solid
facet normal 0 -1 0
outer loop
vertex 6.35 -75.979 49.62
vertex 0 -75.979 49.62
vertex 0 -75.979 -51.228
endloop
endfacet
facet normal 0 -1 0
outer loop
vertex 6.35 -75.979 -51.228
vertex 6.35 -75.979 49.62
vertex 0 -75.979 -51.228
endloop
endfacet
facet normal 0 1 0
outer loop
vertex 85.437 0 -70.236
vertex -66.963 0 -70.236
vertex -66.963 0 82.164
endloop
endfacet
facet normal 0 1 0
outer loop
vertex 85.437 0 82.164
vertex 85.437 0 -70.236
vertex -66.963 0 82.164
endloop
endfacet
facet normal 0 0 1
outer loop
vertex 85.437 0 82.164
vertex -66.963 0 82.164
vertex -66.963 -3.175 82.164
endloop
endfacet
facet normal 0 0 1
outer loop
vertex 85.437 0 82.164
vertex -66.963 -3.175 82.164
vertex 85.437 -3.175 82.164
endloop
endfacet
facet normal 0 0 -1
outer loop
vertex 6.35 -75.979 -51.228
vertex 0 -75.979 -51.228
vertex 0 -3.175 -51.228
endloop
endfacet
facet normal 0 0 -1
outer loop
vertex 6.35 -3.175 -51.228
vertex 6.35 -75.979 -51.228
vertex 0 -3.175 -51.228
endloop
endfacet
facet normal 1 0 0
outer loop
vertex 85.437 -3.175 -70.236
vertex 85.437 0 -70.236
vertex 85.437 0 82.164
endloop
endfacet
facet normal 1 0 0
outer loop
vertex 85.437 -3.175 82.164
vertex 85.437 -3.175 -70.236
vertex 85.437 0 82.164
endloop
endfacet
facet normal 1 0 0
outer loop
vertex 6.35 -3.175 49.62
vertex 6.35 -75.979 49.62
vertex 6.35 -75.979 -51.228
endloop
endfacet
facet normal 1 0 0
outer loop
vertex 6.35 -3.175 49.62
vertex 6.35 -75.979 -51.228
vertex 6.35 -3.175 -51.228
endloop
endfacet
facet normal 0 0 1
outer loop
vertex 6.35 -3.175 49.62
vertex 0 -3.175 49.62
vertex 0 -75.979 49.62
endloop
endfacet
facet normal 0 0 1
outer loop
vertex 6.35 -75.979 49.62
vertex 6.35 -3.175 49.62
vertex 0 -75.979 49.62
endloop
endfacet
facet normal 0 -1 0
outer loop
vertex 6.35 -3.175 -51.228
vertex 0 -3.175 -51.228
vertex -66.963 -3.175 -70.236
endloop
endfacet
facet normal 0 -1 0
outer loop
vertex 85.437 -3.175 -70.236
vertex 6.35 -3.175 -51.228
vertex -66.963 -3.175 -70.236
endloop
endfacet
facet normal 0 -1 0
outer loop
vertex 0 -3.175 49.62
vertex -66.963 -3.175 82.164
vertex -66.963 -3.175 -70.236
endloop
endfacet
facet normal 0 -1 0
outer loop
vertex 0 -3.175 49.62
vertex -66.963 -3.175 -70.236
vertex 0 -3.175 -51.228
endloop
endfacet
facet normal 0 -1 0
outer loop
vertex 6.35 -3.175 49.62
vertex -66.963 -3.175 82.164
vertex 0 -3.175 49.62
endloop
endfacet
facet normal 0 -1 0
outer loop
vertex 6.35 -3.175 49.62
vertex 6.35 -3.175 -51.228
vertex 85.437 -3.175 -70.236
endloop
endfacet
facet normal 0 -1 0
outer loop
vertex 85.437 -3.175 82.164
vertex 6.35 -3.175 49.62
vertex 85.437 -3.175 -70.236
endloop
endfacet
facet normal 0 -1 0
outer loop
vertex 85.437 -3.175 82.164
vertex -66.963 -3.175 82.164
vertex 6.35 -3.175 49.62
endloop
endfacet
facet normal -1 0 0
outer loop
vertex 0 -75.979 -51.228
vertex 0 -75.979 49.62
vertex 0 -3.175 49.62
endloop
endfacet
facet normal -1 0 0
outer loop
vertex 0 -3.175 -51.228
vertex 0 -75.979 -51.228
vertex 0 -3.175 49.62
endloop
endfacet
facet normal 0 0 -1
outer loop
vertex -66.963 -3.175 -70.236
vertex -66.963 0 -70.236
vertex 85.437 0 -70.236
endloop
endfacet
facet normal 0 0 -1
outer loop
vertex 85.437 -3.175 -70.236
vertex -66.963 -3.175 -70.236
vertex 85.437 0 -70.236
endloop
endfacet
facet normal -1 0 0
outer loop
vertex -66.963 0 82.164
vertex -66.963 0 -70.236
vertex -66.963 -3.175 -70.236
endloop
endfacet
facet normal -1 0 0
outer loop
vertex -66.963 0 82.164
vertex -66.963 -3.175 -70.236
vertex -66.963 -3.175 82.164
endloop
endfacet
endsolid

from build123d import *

# Parameters (mm, degrees)
F0_W     = 152.4
F0_H     = 152.4
F1_DEPTH = 3.175
F3_DEPTH = 6.35


# Not quite as in the source:
# - a length typed as a fraction of an inch, garbled in the dataset ("3 / 203.2 mm" for 3/8 in), is restored
# - a feature names something its author has since deleted; it is built from what else it names


with BuildPart() as f1:
    # F0 (on Front) → F1 (new body)
    with BuildSketch(Plane.XZ):
        with Locations((9.2369243503, 5.9638554769)):
            Rectangle(F0_W, F0_H)
    extrude(amount=F1_DEPTH)

    # F2 (on Right) → F3 (join)
    with BuildSketch(Plane.YZ):
        Polygon((0, 0), (0, 49.6197640896), (-75.9790167212, 49.6197640896), (-75.9790167212, -51.2280538678), (0, -51.2280538678), align=None)
    extrude(amount=F3_DEPTH)


solid = f1.part
